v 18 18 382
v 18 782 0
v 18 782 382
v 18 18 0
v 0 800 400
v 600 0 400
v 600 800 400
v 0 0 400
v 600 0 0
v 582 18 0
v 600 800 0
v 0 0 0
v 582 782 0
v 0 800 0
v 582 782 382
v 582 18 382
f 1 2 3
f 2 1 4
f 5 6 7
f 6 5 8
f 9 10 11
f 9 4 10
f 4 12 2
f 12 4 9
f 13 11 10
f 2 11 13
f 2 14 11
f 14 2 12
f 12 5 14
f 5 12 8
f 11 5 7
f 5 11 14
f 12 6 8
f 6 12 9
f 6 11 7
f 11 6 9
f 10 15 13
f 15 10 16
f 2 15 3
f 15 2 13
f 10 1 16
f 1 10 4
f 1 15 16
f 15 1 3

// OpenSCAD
/*
    Sample OpenSCAD script for a simple cabinet with drilling information.
*/

// Define the dimensions of the cabinet
width = 600;
height = 800;
depth = 400;
thickness = 18;

// Module to create a panel
module panel(name, x, y, z, w, h, d) {
    translate([x, y, z])
    cube([w, h, d]);
    echo(str("PANEL:", name, ",", w, ",", h, ",", d, ",", x, ",", y, ",", z));
}

// Module to create a drill hole
module drill_hole(x, y, z, diameter, depth) {
    translate([x, y, z])
    cylinder(h = depth, d = diameter, $fn = 20);
    echo(str("DRILL:", x, ",", y, ",", z, ",", diameter, ",", depth));
}

// Create the cabinet
// Left panel
panel("Left", 0, 0, 0, thickness, height, depth);
drill_hole(thickness / 2, 50, 50, 5, 10);
drill_hole(thickness / 2, 50, 150, 5, 10);

// Right panel
panel("Right", width - thickness, 0, 0, thickness, height, depth);
drill_hole(width - thickness / 2, 50, 50, 5, 10);
drill_hole(width - thickness / 2, 50, 150, 5, 10);

// Top panel
panel("Top", thickness, height - thickness, 0, width - 2 * thickness, thickness, depth);

// Bottom panel
panel("Bottom", thickness, 0, 0, width - 2 * thickness, thickness, depth);

// Back panel
panel("Back", thickness, thickness, depth - thickness, width - 2 * thickness, height - 2 * thickness, thickness);
